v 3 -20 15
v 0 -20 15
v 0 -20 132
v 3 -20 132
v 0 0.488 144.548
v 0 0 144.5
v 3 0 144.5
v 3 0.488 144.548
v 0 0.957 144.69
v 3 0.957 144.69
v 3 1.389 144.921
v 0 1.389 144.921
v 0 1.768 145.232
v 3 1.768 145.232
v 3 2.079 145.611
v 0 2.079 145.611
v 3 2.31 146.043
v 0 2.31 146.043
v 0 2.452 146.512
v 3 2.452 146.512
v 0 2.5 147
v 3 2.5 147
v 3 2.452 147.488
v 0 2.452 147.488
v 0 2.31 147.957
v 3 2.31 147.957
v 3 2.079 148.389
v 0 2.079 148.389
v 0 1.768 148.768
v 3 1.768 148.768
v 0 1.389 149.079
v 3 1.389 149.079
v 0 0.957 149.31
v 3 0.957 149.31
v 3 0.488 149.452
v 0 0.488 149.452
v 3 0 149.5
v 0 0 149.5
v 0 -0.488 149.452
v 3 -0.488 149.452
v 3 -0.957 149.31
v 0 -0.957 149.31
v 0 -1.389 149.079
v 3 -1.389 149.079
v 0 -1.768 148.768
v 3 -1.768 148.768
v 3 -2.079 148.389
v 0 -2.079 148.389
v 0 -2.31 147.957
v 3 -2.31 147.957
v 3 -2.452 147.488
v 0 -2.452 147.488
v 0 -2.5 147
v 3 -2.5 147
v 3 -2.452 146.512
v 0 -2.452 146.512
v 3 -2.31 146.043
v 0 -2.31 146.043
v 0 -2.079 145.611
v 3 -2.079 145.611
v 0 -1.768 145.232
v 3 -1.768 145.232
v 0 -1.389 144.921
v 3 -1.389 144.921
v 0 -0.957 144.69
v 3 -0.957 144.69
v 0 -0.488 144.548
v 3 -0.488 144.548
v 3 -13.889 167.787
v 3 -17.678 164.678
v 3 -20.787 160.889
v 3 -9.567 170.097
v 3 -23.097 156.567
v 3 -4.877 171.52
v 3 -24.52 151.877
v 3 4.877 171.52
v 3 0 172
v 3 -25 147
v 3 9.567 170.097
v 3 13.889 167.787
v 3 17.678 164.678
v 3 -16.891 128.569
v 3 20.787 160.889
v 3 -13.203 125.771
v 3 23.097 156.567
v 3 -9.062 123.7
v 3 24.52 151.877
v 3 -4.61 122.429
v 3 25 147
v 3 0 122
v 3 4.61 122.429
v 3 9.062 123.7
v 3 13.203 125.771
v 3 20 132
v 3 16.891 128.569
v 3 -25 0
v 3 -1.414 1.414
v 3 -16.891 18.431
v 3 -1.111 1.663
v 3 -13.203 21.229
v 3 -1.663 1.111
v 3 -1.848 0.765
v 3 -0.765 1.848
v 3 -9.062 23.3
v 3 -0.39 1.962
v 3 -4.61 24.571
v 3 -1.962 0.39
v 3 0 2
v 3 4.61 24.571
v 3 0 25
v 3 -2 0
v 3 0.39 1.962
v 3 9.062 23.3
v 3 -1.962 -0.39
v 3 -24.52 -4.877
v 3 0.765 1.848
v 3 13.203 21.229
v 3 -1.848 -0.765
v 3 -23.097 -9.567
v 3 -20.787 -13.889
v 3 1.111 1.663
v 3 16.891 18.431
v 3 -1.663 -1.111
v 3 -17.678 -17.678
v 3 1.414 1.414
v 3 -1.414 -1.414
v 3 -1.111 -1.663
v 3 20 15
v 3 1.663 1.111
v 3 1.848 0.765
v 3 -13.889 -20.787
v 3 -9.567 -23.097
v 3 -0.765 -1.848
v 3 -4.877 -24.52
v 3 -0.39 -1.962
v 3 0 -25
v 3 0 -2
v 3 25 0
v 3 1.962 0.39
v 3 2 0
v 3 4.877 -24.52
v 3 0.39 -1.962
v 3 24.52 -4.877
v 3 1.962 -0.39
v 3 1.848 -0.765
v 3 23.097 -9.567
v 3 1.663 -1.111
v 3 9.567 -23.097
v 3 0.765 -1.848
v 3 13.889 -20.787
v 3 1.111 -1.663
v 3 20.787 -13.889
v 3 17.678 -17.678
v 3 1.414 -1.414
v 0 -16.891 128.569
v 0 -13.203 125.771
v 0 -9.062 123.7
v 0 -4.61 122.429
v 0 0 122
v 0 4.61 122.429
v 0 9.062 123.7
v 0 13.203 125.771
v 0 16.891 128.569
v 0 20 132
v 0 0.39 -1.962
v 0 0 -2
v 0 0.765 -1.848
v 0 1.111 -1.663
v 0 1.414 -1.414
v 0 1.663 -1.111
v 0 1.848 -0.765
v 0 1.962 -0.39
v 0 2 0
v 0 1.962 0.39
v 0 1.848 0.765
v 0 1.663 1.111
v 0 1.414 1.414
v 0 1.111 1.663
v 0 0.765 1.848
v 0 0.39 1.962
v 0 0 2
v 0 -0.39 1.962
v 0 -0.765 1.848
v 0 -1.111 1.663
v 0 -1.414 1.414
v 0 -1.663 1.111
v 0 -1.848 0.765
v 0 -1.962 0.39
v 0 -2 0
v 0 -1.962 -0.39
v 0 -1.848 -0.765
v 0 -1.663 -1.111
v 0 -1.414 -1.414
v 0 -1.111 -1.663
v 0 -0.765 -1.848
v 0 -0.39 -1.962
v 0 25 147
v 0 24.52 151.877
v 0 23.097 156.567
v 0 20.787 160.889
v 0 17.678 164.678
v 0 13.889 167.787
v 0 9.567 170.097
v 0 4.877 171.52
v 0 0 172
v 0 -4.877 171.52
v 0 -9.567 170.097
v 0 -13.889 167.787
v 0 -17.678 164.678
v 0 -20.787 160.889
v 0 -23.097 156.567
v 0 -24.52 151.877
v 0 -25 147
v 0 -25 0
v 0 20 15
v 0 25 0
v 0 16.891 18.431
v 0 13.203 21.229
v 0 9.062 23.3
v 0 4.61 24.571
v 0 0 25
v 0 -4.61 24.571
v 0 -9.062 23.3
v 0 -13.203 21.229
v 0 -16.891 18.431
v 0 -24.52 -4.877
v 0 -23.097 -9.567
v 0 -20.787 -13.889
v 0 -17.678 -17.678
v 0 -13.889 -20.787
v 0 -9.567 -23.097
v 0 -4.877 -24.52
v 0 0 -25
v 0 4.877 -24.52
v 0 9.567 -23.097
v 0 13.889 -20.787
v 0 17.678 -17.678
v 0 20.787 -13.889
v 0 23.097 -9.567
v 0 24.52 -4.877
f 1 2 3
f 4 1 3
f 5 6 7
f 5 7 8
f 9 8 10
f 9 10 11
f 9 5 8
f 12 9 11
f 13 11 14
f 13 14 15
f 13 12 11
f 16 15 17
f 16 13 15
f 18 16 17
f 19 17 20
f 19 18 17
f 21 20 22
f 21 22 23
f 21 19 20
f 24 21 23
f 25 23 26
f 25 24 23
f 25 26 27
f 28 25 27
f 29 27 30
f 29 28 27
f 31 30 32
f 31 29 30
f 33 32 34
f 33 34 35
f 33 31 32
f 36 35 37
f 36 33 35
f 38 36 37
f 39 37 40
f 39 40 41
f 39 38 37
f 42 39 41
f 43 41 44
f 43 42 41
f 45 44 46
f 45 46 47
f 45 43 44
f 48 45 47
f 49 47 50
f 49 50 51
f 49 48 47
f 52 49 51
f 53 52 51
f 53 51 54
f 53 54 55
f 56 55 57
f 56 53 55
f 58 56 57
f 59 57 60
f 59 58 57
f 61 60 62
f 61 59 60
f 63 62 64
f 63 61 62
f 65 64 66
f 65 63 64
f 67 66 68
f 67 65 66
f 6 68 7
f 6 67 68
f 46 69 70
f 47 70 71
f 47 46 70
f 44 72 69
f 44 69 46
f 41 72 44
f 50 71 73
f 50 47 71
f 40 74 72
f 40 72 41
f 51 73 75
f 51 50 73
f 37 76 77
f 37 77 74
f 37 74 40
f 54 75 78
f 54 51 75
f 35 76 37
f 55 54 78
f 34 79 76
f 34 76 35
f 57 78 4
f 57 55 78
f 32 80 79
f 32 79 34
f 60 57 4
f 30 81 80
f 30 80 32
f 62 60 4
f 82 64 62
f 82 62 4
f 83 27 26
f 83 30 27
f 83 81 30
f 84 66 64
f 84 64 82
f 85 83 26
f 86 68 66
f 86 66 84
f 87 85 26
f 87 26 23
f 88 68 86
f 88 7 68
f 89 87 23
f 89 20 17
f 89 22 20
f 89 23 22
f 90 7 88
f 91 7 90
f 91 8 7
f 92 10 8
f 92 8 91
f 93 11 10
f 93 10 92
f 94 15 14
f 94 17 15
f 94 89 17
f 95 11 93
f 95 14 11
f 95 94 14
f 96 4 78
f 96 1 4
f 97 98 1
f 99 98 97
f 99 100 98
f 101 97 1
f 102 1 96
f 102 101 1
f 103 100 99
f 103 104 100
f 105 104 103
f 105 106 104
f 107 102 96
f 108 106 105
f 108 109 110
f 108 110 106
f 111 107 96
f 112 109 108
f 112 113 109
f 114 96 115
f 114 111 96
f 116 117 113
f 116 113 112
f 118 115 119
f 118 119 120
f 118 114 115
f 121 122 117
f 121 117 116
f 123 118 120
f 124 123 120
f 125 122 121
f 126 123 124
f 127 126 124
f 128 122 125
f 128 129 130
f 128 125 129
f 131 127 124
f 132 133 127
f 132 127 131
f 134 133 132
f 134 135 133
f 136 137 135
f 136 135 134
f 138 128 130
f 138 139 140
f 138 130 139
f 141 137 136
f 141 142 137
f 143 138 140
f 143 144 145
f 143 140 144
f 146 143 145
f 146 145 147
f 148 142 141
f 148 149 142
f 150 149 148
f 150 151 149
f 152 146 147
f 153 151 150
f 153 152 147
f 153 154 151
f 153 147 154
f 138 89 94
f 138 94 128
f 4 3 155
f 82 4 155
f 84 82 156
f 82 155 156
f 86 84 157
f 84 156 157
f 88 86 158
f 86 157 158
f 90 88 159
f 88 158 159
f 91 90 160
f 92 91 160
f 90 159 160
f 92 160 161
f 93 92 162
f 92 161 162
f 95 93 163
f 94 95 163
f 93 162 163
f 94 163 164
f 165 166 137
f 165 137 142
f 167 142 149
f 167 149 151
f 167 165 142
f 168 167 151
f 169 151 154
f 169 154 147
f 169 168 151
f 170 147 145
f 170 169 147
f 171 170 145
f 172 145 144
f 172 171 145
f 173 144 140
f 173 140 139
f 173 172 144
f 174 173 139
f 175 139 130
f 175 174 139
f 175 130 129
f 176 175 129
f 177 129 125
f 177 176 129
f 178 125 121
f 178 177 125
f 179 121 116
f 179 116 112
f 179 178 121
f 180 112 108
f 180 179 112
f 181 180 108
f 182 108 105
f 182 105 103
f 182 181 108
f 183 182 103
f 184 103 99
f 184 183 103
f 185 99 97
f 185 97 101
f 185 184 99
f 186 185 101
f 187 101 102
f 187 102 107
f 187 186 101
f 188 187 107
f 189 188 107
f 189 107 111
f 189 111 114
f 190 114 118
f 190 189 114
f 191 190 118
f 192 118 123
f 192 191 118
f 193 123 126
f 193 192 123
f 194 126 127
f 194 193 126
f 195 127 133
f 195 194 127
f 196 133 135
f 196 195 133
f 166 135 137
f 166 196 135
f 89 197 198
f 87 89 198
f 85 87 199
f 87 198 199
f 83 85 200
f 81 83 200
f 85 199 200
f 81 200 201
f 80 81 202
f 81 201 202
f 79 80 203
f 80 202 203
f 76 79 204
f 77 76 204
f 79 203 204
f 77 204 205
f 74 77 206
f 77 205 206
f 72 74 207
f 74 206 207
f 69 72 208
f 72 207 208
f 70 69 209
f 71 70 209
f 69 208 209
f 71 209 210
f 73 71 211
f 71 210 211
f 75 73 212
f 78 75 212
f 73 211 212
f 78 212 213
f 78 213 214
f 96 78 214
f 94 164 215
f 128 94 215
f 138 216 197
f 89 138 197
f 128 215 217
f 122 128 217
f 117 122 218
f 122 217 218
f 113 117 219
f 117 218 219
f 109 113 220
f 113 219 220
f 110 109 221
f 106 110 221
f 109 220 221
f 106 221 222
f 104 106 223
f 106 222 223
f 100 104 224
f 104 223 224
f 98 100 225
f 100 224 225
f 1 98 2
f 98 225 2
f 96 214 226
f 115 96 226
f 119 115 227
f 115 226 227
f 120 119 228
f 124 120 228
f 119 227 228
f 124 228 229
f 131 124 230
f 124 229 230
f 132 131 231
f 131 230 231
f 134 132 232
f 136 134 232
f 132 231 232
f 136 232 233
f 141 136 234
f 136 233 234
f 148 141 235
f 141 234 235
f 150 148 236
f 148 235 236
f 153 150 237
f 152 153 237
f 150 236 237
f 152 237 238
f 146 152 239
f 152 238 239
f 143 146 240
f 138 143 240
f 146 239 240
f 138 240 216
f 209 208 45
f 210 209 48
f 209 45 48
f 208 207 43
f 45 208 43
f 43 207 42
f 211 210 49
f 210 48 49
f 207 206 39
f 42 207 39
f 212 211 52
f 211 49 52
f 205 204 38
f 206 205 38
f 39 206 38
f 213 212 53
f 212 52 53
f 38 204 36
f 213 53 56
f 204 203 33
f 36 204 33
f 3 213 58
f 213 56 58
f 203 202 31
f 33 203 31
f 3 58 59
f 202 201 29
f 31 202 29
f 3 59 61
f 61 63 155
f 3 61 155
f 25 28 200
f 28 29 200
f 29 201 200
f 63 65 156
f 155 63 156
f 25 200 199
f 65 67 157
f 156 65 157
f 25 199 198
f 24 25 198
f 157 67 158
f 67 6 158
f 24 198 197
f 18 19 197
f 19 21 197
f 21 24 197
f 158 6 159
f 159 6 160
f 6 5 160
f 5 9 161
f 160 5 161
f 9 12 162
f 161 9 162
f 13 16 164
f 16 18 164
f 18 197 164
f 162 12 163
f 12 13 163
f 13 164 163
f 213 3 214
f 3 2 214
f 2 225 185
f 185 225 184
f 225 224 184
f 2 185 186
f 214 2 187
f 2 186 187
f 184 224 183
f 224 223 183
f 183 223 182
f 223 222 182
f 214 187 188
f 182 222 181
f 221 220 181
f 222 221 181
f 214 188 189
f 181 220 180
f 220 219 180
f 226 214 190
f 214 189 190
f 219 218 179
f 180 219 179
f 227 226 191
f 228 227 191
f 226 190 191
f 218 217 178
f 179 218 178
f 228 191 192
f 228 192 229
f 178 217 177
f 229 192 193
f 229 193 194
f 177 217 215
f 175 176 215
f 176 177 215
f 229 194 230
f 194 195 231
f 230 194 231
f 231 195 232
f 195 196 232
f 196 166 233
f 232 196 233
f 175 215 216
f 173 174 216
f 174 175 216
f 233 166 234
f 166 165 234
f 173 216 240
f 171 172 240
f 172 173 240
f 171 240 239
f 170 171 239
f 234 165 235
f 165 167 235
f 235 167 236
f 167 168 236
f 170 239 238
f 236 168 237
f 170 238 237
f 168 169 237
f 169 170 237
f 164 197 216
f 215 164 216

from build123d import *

# Parameters (mm, degrees)
SKETCH1_R           = 2
SKETCH1_R_2         = 2.5
BOSS_EXTRUDE1_DEPTH = 3


with BuildPart() as part:
    # Sketch1 → Boss-Extrude1 (new body)
    with BuildSketch(Plane(origin=(0, 0, 0), x_dir=(0, 0, -1), z_dir=(1, 0, 0))):
        with BuildLine():
            Line((0, 25), (-147, 25))
            ThreePointArc((-147, 25), (-172, 0), (-147, -25))
            Line((-147, -25), (0, -25))
            ThreePointArc((0, -25), (25, 0), (0, 25))
        make_face()
        with BuildLine():
            Line((-132, 20), (-15, 20))
            ThreePointArc((-15, 20), (-25, 0), (-15, -20))
            Line((-15, -20), (-132, -20))
            ThreePointArc((-132, -20), (-122, 0), (-132, 20))
        make_face(mode=Mode.SUBTRACT)
        Circle(SKETCH1_R, mode=Mode.SUBTRACT)
        with Locations((-147, 0)):
            Circle(SKETCH1_R_2, mode=Mode.SUBTRACT)
    extrude(amount=BOSS_EXTRUDE1_DEPTH)


solid = part.part
